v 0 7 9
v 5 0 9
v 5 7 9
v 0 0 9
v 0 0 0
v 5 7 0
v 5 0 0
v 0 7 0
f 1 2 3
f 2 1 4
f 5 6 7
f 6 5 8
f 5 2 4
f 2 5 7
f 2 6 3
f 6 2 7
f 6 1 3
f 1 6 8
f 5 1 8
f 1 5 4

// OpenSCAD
// Generated by SolidPython 1.0.1 on 2020-07-29 00:39:26


cube(size = [5, 7, 9]);
/***********************************************
*********      SolidPython code:      **********
************************************************
 
# import packages: SolidPython
from solid import *
from solid.utils import *
from itertools import chain, combinations


class Resize:

    def __init__(self, scad_file):
        self.scad_file = scad_file
        #self.scad_file = import_scad(scad_file)
        # cone/cylinder param:
        self.r1 = 0
        self.r2 = 0
        self.h = 0
        # rectangular prism param:
        self.w = 0
        self.l = 0
        # ellipse param:
        self.r = 0

    # import OpenScad code (file name corresponds to shape)


    # classify shape + parameters
    def assign(self, param1, param2, param3):
        if self.scad_file == 'cone.scad':
            self.r1 = param1
            self.r2 = param2
            self.h = param3
        elif self.scad_file == 'cylinder.scad':
            self.r1 = param1
            self.r2 = param2
            self.h = param3
        elif self.scad_file == 'rectangularPrism.scad':
            self.h = param1
            self.l = param2
            self.w = param3
        else:
            self.r = param1
            self.h = param2

    # resize parameters
    def iterate(self):
        x = range(3, 20, 2)
        i = 1
        if self.scad_file == 'cone.scad':
            tempList = list(combinations(x, 2))
            for temp in tempList:
                param1 = temp[0]
                param2 = temp[1]
                filepath = 'produced_scad_files/' + 'cone' + str(param1) + '_' + str(param2) + '_' + '.scad'
                scad_render_to_file(cylinder(h=param1, r1=param2, r2=0), filepath)

        elif self.scad_file == 'cylinder.scad':
            tempList = list(combinations(x, 3))
            for temp in tempList:
                param1 = temp[0]
                param2 = temp[1]
                filepath = 'produced_scad_files/' + 'cylinder' + str(param1) + '_' + str(param2) + '_' + '.scad'
                scad_render_to_file(cylinder(h=param1, r1=param2, r2=param2), filepath)

        elif self.scad_file == 'rectangularPrism.scad':
            tempList = list(combinations(x, 3))
            for temp in tempList:
                param1 = temp[0]
                param2 = temp[1]
                param3 = temp[2]
                filepath = 'produced_scad_files/' + 'rectangularPrism' + str(param1) + '_' + str(param2) + '_' + str(
                    param3) + '.scad'
                scad_render_to_file(cube(size=(param1, param2, param3)), filepath)

        elif self.scad_file == 'ellipse.scad':
            tempList = list(combinations(x, 4))
            for temp in tempList:
                param1 = temp[0]
                param2 = temp[1]
                param3 = temp[2]
                param4 = temp[3]
                filepath = 'produced_scad_files/' + 'ellipse' + str(param1) + '_' + str(param2) + '_' + str(param3) + '_' + str(param4) + '.scad'
                scad_render_to_file(scale([param1, param2, param3])(sphere(r=param4)), filepath)

    def render_to_scadfile(self):
        scad_render_to_file(scad, 'example.scad') 
 
************************************************/
